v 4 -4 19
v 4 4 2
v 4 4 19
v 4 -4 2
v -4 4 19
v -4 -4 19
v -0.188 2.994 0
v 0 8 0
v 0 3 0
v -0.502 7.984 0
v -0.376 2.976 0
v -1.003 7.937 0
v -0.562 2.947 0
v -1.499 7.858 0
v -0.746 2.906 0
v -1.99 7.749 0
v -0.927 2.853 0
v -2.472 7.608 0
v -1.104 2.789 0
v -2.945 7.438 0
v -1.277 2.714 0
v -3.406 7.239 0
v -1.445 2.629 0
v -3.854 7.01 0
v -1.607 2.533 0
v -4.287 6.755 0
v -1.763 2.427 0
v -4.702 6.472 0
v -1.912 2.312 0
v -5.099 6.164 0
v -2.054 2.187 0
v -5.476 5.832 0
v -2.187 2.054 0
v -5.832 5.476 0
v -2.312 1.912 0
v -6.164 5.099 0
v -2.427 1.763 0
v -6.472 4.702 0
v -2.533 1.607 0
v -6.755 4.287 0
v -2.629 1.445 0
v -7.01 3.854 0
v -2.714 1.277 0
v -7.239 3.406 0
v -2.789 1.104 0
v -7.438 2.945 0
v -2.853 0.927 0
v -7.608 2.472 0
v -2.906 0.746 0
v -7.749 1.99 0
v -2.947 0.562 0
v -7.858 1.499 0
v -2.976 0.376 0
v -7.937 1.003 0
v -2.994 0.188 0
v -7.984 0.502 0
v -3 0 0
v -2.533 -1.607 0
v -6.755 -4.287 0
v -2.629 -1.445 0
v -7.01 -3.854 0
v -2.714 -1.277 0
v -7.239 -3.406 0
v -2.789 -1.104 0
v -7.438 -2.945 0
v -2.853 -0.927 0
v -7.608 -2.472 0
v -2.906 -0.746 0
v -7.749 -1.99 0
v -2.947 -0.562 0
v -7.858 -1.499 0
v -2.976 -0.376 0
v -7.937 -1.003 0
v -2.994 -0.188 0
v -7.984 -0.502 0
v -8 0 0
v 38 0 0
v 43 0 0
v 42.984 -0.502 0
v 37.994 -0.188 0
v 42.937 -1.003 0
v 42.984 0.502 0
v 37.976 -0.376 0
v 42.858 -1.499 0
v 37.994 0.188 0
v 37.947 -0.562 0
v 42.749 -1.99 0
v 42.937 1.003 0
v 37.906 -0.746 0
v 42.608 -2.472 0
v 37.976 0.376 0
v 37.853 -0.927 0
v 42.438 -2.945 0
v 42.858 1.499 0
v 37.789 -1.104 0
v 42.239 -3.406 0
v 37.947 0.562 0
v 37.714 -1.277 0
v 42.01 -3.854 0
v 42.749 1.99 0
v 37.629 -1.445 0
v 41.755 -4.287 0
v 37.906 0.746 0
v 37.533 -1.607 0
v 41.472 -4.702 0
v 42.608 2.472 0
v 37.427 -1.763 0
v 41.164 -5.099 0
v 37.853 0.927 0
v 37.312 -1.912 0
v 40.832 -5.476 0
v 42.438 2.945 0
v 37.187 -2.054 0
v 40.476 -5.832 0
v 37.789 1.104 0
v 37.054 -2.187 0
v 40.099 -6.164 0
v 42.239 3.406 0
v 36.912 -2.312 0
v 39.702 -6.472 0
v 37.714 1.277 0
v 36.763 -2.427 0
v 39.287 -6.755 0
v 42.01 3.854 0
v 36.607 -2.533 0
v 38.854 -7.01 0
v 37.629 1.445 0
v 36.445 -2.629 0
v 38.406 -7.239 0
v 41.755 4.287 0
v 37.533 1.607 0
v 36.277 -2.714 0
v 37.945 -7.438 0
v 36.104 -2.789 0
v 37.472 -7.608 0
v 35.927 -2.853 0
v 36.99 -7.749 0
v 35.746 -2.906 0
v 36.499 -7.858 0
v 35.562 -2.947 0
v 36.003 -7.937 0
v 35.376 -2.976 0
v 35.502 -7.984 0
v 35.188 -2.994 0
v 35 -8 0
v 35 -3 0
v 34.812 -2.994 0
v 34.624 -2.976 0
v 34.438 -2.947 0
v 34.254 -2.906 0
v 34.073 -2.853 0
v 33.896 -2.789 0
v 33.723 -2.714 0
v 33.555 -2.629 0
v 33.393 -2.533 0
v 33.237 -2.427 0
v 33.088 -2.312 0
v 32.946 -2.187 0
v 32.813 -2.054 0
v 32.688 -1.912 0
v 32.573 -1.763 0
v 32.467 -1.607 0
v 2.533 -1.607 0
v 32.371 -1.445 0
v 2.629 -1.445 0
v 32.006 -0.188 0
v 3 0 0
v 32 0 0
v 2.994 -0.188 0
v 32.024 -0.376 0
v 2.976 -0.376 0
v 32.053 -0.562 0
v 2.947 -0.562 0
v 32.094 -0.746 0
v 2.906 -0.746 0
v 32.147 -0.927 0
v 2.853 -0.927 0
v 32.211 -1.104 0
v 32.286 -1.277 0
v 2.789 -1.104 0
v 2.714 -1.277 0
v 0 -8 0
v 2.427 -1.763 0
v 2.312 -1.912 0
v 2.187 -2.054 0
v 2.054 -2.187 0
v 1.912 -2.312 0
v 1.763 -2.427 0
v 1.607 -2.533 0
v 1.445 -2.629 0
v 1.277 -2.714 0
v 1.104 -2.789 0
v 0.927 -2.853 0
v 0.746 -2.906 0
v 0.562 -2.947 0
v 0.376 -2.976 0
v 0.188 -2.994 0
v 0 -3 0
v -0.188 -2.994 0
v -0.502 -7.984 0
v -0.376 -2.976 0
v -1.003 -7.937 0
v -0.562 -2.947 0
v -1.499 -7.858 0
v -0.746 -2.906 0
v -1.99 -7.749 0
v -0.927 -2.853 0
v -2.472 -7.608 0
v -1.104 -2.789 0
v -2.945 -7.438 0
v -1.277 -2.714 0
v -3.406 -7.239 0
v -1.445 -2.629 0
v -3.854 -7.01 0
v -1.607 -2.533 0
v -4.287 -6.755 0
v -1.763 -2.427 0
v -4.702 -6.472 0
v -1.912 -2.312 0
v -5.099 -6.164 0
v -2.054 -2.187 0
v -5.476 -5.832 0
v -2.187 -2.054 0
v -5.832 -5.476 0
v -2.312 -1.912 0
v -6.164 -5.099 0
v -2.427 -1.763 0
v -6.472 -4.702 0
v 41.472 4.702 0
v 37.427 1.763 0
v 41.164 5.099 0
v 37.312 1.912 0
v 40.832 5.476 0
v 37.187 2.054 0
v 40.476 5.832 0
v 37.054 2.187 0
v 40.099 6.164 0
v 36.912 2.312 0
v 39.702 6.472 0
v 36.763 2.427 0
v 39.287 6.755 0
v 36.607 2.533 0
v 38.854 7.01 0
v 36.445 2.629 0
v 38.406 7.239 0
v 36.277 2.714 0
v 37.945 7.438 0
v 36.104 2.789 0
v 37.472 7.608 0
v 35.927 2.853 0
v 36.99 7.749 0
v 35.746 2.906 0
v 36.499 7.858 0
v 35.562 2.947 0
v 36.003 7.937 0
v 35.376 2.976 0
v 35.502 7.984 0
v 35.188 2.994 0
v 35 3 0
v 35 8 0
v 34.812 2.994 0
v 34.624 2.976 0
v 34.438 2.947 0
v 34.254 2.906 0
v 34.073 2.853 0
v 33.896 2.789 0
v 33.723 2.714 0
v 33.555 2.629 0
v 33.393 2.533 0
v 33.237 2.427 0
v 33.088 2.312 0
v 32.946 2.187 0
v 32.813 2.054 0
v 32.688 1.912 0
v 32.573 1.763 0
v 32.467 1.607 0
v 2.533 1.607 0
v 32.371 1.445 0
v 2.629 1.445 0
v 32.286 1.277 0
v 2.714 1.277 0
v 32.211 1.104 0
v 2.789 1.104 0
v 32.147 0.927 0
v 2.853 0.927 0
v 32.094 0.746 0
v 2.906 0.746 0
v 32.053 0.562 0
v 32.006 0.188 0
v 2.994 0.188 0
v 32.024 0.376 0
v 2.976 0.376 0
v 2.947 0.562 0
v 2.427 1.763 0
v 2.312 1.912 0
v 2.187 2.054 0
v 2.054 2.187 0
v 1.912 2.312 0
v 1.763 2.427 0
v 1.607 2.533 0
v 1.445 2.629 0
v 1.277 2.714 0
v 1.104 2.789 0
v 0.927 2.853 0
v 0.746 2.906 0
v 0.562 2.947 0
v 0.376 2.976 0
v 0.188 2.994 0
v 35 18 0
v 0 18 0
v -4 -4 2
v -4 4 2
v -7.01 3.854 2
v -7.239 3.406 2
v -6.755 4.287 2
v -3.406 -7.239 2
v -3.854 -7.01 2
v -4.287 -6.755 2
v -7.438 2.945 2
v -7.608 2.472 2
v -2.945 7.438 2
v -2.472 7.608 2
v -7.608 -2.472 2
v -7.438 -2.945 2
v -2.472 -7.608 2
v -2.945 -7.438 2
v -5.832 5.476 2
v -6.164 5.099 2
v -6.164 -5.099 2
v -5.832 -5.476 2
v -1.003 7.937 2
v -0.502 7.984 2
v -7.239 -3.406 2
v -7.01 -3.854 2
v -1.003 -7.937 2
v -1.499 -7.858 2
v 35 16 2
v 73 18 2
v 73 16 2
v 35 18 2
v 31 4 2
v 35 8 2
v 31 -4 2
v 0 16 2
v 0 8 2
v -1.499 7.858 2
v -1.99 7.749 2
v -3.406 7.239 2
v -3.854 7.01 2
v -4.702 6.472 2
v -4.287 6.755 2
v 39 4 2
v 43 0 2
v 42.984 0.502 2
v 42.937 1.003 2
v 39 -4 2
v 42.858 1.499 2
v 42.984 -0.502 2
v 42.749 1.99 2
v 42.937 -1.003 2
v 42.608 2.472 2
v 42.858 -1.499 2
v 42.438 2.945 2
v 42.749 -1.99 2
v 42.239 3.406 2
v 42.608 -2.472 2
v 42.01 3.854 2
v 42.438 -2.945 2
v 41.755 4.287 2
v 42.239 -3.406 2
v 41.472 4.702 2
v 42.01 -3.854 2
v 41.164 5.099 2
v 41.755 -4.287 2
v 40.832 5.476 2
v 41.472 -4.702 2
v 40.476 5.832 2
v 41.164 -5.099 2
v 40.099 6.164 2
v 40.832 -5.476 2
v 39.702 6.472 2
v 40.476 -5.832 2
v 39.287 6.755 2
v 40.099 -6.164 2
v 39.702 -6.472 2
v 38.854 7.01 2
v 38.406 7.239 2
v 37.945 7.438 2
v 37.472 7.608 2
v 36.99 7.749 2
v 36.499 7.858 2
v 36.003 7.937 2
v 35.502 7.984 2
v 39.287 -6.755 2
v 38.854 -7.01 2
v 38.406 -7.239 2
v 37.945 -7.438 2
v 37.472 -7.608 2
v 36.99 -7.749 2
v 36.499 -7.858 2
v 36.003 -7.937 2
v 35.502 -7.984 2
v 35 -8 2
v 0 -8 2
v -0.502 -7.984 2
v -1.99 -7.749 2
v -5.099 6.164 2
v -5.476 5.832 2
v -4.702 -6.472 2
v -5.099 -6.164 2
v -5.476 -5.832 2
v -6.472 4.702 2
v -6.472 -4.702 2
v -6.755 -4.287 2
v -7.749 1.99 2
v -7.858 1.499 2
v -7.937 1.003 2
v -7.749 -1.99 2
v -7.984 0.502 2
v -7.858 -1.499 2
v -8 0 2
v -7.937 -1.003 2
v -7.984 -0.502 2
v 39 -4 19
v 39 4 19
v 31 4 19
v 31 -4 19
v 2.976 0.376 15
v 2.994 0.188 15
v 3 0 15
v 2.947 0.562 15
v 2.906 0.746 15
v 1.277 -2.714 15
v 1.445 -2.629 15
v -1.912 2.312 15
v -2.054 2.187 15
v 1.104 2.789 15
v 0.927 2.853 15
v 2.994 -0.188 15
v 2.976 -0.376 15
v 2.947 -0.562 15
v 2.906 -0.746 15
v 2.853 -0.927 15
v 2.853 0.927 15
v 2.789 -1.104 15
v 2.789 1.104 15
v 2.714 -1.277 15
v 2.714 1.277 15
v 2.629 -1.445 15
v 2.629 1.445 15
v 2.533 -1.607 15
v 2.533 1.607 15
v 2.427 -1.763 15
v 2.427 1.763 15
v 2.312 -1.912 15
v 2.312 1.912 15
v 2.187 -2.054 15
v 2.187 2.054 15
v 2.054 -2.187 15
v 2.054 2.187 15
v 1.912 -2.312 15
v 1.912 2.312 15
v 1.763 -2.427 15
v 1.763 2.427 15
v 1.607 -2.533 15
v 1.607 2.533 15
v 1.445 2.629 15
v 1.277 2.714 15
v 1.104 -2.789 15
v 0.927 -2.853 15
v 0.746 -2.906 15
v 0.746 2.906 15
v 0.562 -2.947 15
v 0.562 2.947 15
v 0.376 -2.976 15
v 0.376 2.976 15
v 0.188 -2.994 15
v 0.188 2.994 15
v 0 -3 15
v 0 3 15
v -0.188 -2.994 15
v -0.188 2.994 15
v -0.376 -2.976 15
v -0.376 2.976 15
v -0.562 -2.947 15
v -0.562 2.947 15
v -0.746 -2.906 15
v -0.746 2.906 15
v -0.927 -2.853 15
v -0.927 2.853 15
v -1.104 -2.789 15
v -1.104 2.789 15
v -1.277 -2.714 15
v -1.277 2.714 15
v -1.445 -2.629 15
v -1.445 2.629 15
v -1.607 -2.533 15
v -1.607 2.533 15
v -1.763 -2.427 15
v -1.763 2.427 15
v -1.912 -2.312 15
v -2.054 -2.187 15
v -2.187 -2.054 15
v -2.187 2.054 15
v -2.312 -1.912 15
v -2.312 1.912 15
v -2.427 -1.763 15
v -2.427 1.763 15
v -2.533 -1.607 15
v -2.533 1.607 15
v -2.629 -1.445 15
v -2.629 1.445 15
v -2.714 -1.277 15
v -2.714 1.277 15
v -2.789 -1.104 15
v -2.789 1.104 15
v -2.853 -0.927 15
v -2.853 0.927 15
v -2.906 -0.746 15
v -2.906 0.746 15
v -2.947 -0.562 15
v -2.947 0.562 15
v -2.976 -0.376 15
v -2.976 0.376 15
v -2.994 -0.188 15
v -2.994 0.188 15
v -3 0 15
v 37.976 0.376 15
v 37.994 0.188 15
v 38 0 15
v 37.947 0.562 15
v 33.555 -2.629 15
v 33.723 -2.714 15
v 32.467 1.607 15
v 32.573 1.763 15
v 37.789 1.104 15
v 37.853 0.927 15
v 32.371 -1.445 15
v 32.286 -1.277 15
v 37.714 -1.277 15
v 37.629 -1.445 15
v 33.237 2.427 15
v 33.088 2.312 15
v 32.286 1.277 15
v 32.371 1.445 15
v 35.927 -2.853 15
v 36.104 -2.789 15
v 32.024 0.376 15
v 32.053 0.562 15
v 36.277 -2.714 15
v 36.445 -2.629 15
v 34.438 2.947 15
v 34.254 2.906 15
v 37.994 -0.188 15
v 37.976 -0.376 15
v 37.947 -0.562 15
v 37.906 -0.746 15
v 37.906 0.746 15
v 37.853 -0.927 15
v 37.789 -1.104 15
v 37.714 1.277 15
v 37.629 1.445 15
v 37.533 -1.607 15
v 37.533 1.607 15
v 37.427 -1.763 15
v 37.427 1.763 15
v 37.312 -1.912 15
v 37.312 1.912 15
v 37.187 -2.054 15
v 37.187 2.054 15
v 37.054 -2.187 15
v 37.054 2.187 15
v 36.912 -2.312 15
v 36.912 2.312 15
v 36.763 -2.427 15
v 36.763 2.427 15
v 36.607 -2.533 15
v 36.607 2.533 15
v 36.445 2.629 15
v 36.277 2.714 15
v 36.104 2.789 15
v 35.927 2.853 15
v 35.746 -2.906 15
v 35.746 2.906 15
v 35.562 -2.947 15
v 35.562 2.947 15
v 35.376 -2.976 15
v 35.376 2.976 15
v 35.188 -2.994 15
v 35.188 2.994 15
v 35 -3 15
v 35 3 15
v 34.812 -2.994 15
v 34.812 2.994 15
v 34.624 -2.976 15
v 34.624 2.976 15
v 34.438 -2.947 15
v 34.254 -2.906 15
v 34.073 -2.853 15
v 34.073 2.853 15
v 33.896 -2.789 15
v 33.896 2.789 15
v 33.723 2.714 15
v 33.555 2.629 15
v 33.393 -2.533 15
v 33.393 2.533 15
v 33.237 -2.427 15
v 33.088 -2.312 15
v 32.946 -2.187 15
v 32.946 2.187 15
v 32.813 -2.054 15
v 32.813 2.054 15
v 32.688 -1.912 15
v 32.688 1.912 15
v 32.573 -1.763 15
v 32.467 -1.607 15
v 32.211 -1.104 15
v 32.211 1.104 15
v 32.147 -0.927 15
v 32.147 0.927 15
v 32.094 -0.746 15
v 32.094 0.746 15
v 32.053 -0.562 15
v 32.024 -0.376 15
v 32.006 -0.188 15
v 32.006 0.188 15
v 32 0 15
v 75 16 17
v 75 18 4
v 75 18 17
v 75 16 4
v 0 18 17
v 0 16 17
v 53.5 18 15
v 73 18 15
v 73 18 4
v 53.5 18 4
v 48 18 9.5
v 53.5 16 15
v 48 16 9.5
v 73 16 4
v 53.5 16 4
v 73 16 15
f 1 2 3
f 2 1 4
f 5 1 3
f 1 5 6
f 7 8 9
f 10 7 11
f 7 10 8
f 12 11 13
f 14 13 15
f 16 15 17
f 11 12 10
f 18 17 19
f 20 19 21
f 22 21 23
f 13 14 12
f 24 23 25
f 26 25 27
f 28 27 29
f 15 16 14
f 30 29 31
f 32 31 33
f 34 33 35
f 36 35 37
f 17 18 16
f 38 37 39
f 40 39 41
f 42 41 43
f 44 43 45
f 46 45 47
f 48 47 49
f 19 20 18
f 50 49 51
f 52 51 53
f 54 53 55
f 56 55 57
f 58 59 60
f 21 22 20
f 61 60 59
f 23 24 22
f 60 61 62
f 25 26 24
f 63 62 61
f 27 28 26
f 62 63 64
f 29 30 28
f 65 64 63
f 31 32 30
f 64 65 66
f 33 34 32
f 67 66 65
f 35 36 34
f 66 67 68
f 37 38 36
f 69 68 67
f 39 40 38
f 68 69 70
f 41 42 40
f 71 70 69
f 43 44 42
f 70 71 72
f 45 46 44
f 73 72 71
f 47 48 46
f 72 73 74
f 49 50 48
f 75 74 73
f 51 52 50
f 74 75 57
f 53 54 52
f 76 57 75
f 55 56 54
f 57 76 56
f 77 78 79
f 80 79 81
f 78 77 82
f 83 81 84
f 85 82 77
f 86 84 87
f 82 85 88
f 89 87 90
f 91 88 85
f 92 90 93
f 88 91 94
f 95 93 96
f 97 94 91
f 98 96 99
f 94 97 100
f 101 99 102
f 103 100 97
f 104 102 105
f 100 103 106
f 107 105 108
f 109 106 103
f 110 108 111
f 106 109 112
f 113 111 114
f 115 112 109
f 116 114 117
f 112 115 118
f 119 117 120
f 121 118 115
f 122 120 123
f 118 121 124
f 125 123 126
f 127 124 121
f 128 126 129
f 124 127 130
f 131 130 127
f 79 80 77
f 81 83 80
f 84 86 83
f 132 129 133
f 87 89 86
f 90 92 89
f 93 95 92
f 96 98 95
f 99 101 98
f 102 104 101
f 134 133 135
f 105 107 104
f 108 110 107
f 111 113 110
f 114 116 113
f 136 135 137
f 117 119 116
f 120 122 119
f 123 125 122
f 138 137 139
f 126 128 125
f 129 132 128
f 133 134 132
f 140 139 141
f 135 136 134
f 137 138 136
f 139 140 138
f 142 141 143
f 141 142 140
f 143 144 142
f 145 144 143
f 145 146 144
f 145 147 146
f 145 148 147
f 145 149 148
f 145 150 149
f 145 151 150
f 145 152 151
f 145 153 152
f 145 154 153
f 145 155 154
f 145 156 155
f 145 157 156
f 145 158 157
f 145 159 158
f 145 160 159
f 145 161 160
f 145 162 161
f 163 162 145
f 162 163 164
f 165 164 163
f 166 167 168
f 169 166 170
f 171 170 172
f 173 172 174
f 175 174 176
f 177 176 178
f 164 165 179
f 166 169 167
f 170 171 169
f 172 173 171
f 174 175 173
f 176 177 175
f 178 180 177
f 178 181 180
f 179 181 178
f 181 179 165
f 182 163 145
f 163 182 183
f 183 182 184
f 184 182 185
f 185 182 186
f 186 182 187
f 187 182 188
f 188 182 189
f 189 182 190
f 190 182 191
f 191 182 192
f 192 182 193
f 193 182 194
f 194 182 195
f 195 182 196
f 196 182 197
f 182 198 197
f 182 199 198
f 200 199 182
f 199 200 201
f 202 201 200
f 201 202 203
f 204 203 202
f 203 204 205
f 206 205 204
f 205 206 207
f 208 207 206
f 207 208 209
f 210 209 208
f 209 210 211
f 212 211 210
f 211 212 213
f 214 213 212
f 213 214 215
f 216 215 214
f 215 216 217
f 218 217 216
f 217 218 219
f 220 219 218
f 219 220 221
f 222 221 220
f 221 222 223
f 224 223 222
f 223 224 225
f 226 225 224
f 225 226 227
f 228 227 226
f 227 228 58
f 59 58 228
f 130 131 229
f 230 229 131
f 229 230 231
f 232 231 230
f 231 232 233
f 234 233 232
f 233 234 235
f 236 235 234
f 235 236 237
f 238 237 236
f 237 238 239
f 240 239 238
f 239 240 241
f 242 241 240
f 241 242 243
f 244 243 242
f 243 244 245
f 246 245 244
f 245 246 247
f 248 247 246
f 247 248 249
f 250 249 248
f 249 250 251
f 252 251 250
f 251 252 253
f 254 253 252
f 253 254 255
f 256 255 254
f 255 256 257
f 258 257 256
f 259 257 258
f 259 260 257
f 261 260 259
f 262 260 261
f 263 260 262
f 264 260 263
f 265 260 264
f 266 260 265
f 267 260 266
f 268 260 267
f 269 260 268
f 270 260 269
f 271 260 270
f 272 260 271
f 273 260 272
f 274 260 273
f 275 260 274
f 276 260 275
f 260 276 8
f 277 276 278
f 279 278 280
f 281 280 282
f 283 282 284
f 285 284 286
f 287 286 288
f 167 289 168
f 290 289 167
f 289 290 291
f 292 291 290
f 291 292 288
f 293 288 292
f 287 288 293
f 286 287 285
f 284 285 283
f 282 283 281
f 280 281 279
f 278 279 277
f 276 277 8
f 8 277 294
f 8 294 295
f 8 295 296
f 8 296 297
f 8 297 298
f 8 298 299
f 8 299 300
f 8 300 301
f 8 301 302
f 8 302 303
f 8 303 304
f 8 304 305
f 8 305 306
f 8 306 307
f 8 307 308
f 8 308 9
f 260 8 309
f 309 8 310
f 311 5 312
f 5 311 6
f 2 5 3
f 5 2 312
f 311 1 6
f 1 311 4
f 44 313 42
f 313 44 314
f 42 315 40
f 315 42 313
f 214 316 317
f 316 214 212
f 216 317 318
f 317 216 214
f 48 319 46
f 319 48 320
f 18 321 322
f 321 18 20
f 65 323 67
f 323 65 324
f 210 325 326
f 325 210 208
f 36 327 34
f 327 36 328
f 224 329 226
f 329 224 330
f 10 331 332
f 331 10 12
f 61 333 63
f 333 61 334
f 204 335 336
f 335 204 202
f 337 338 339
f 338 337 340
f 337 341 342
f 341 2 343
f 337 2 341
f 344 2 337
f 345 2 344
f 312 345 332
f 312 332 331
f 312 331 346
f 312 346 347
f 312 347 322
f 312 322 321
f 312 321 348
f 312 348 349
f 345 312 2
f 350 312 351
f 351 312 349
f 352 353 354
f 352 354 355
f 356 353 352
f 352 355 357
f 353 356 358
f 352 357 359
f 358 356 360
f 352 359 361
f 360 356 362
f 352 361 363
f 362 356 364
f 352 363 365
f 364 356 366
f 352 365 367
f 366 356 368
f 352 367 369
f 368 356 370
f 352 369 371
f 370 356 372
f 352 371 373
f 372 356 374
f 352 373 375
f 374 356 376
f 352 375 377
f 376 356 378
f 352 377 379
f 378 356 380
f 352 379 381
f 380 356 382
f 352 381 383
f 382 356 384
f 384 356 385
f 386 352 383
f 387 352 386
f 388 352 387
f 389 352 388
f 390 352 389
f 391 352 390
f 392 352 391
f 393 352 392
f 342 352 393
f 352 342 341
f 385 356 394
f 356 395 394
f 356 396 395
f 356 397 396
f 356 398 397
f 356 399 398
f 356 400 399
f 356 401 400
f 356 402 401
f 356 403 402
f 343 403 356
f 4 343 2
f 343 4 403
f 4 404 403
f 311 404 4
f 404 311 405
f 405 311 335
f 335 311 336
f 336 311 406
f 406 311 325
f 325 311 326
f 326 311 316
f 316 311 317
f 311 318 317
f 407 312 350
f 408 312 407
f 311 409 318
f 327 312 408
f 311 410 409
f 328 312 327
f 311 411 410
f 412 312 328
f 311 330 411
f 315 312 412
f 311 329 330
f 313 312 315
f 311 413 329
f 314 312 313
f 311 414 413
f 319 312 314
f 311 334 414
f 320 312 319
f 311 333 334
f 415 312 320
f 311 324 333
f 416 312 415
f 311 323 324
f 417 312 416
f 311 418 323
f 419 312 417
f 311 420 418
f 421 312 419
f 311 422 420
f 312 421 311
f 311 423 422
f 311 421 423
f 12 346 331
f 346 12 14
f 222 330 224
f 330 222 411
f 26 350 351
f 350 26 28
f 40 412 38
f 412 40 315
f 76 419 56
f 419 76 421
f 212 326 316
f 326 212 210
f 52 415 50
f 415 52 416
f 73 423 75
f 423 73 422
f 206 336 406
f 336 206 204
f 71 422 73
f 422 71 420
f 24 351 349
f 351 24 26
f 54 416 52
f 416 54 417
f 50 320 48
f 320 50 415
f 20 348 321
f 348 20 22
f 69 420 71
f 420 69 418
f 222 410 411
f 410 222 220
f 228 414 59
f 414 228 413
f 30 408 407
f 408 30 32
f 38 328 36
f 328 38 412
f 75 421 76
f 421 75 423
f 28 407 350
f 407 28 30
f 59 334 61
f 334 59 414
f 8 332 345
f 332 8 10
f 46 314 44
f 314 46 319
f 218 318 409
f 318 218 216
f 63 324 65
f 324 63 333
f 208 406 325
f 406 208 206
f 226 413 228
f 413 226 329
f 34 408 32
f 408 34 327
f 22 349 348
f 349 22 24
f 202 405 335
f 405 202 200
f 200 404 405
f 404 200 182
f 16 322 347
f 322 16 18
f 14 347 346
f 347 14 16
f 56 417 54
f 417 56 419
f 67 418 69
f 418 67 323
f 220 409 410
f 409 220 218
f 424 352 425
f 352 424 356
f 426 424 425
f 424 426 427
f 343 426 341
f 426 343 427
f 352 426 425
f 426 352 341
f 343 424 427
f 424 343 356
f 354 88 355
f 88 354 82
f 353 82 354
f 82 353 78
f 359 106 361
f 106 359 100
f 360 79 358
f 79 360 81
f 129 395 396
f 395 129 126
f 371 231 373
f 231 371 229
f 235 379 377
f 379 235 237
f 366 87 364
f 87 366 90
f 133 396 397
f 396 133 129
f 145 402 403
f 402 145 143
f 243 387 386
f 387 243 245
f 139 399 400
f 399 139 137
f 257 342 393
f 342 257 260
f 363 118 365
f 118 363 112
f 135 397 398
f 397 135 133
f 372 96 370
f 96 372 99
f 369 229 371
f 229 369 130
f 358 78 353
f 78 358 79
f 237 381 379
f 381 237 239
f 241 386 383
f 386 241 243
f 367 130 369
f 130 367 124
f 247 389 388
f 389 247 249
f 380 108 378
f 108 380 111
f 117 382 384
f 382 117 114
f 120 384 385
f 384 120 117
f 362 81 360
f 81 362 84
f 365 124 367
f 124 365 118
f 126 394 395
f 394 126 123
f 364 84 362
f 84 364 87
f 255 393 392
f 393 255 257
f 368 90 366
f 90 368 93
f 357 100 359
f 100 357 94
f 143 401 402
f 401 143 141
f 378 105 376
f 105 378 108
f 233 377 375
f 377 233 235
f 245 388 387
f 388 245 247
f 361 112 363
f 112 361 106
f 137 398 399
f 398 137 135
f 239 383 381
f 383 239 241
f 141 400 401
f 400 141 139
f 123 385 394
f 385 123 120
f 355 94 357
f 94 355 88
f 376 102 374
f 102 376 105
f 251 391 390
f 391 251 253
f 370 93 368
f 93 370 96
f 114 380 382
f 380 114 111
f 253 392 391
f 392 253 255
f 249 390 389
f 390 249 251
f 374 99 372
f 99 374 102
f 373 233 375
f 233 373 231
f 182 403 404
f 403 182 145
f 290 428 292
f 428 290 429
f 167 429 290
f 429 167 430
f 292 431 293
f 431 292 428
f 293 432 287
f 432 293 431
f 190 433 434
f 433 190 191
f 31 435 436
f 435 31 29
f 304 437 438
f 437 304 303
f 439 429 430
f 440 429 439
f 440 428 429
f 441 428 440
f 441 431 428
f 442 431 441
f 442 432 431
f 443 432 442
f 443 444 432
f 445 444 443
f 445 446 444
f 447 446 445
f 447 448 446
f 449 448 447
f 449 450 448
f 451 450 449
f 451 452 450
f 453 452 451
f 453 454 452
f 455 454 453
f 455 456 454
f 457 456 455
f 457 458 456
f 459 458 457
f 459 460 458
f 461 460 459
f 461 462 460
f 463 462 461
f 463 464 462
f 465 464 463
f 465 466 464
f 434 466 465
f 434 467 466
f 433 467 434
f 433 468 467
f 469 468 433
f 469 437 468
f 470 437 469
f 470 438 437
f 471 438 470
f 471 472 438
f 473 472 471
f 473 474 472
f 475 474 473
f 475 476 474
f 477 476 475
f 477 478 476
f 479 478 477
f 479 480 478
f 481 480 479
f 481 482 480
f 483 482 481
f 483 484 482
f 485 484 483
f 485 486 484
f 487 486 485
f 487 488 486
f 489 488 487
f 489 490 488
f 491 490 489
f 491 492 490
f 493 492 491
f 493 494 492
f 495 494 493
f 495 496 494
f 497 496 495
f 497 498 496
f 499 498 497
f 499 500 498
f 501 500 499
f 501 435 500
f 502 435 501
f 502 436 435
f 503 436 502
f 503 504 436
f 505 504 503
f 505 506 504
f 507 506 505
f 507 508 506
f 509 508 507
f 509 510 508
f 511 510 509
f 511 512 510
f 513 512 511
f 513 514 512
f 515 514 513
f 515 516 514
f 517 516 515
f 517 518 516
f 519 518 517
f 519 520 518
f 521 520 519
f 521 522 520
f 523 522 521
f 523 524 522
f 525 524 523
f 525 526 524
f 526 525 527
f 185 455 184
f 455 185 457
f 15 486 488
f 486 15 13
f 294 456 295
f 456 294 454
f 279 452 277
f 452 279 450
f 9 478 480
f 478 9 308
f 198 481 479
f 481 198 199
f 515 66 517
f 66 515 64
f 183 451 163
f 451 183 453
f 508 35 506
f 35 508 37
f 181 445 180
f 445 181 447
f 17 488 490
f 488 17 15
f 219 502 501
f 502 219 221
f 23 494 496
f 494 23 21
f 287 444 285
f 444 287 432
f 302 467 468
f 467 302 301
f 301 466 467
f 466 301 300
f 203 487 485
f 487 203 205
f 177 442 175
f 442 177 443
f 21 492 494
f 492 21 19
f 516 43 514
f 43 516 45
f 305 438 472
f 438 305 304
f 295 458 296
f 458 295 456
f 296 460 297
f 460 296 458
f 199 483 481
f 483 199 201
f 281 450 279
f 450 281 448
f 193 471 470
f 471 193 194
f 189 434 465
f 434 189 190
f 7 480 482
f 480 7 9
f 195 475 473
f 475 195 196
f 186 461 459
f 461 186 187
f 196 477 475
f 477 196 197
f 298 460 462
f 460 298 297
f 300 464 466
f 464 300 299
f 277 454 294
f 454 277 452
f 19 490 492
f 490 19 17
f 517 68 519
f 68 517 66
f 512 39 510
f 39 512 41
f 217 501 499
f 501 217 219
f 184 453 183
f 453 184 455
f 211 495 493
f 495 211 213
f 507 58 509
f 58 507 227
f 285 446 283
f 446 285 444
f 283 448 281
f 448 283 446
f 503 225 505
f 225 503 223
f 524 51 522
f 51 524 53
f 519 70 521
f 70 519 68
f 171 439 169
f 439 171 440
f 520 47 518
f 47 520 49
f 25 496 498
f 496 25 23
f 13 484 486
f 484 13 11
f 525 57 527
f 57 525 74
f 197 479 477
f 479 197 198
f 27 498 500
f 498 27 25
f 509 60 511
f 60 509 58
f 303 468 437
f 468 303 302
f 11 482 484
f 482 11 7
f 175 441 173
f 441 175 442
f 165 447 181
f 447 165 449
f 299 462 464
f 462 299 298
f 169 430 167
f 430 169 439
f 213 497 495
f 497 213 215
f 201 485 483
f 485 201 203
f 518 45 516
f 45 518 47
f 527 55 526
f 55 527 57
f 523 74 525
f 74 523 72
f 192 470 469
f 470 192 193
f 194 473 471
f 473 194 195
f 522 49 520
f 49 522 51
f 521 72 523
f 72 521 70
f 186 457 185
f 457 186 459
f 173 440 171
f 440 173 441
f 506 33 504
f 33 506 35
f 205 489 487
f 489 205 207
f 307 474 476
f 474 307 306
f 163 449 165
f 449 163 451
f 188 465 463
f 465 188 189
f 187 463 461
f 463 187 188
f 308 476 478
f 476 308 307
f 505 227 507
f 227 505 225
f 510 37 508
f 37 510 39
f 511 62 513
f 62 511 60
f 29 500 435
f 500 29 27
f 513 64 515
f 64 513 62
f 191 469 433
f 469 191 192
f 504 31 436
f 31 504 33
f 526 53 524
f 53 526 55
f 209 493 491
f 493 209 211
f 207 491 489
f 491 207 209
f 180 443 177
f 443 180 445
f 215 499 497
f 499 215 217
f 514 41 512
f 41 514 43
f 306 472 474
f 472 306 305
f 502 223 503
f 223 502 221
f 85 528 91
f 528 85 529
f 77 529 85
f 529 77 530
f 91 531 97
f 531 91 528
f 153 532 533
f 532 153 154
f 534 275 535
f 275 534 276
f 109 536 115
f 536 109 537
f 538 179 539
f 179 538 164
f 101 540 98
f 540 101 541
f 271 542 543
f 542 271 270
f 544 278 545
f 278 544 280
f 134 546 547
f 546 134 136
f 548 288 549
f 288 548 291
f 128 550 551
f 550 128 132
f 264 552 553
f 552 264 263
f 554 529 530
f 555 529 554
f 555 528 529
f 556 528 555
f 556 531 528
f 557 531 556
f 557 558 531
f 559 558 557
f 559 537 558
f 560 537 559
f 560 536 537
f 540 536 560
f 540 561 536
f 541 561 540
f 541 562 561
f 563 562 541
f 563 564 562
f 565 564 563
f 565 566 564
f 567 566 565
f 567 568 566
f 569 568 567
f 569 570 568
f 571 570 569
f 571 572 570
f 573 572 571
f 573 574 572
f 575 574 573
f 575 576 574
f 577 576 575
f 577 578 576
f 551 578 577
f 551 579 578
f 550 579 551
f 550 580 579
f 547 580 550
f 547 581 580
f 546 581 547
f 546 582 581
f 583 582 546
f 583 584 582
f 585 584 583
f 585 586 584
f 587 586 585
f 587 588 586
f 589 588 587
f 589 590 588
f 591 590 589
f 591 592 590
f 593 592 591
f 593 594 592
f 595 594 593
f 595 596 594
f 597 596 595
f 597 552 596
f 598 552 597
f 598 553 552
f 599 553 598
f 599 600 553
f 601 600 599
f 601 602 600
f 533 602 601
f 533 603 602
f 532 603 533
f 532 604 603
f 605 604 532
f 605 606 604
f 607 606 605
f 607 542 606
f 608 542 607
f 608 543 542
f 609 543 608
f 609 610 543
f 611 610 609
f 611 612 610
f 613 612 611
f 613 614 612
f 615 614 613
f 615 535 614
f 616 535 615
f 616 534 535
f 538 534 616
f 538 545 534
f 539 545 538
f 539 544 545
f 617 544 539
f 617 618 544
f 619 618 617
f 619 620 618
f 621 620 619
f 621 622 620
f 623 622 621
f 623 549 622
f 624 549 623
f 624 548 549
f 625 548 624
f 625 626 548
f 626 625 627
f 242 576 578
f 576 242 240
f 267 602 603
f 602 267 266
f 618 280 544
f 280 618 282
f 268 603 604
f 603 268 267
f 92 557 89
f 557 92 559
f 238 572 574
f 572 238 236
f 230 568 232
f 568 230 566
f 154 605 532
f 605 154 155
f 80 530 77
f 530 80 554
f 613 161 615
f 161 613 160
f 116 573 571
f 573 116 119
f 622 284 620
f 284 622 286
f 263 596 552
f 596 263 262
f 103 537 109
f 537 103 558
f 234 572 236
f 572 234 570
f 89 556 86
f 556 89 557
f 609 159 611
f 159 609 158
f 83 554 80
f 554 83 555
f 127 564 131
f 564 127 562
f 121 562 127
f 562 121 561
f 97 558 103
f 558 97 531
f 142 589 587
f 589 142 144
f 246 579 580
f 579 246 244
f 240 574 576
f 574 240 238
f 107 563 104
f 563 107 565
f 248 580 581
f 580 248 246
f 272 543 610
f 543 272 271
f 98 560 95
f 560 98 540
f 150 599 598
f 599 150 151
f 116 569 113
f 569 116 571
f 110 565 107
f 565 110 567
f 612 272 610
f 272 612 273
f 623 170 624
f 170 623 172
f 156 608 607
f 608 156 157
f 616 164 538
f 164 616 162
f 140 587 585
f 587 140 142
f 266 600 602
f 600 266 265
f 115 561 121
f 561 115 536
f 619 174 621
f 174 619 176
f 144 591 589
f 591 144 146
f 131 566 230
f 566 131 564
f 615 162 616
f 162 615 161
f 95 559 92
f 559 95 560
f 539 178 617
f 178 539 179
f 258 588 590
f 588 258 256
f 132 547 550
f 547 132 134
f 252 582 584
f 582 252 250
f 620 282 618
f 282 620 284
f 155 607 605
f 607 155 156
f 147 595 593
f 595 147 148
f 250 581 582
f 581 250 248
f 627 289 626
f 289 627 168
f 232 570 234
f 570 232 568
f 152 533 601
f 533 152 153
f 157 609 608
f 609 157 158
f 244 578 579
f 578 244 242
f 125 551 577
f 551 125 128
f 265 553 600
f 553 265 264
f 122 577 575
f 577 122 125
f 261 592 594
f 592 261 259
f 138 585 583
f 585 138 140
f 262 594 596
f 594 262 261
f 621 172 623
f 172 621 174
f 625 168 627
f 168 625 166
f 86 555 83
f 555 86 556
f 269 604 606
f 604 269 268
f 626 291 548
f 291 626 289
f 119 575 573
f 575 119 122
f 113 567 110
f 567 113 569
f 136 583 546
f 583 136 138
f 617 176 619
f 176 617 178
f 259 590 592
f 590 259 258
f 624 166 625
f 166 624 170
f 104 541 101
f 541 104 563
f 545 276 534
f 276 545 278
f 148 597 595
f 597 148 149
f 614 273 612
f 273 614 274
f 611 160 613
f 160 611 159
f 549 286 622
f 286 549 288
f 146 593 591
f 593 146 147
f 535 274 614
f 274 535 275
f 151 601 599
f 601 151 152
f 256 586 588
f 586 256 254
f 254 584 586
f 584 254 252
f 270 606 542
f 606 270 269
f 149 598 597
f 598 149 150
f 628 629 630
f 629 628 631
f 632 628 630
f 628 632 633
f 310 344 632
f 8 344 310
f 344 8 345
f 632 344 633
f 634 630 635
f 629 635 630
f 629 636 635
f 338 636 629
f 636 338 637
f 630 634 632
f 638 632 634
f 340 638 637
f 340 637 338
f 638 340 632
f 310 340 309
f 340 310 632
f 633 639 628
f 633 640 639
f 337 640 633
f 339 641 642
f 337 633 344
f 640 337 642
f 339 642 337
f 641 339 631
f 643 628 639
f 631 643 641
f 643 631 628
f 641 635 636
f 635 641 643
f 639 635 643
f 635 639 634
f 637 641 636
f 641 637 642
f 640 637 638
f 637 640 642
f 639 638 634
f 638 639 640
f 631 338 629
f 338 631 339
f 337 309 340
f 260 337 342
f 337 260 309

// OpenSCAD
$fn = 100;

is_laser_cut = true;
laser_material_thickness = 3;
threed_print_thickness = 5;
material_thickness = is_laser_cut ?
                        laser_material_thickness :
                        threed_print_thickness;

pin_diameter = 6;
pin_radius = pin_diameter/2;

gripper_track_long_horizontal_leg_length = 25;
gripper_track_short_horizontal_leg_length = 2;
gripper_track_vertical_length = 20;

cutter_track_length = gripper_track_long_horizontal_leg_length + gripper_track_short_horizontal_leg_length;

bottom_gripper_track_offset = 0;
bottom_gripper_track_height = gripper_track_vertical_length;
gripper_track_separation = 70;
top_gripper_track_offset = bottom_gripper_track_offset + bottom_gripper_track_height + gripper_track_separation;
top_gripper_track_height = gripper_track_vertical_length;
gripper_cutter_track_separation = 30 + gripper_track_vertical_length-pin_diameter;
cutter_track_offset = top_gripper_track_offset + top_gripper_track_height + gripper_cutter_track_separation;
cutter_track_height = pin_diameter;

slider_side = gripper_track_long_horizontal_leg_length + gripper_track_short_horizontal_leg_length;
slider_vertical_travel = 20;
total_slider_travel = slider_side + slider_vertical_travel - 4*pin_radius + gripper_track_vertical_length;

horizontal_track_separation = 20;

bottom_gripper_slider_track_offset = bottom_gripper_track_offset + bottom_gripper_track_height - pin_diameter;
top_gripper_slider_track_offset = top_gripper_track_offset + gripper_track_vertical_length - pin_diameter;
cutter_slider_track_offset = cutter_track_offset;
cutter_slider_track_height = 0
    + pin_radius
    + (gripper_track_vertical_length - pin_diameter)
    + slider_vertical_travel
    + (slider_side - pin_diameter)
    + pin_radius;
second_slider_track_offset = 35;
slider_margin = 5;
slider_width = 2*(cutter_track_length + second_slider_track_offset) + horizontal_track_separation + 2*slider_margin;
slider_length = slider_margin +
                cutter_slider_track_offset +
                cutter_slider_track_height +
                slider_margin;
slider_thickness = material_thickness;


top_guide_wall_thickness = material_thickness;
guide_support_thickness = slider_thickness+0.5;
guide_support_diameter = 10;
guide_support_radius = guide_support_diameter/2;
guide_support_hole_diameter = 3.5;
giode_support_hole_radius = guide_support_hole_diameter/2;
guide_width = slider_width + 2*guide_support_diameter;
guide_length = slider_margin +
               bottom_gripper_track_height +
               gripper_track_separation +
               top_gripper_track_height +
               gripper_cutter_track_separation +
               cutter_track_height +
               slider_margin; //2*vertical_track_separation + gripper_track_vertical_length;
guide_thickness = material_thickness;

pin_pad_thickness = 2;
pin_pad_radius = pin_radius + 5;
pin_stickout = 15;
pin_height = 2*guide_thickness + guide_support_thickness + pin_stickout;

pin_cap_radius = pin_radius + 1;
pin_cap_pad_radius = pin_pad_radius;
pin_cap_pad_thickness = pin_pad_thickness;



module gripper_track(h) {
    curve_cut = pin_radius/2;
    
    p1 = [ pin_radius,
           pin_radius + gripper_track_vertical_length - pin_diameter];
    p2 = [ pin_radius + gripper_track_long_horizontal_leg_length - pin_diameter,
           pin_radius + gripper_track_vertical_length - pin_diameter];
    p3 = [ pin_radius + gripper_track_long_horizontal_leg_length - pin_diameter,
           pin_radius];
    p4 = [ pin_radius + gripper_track_long_horizontal_leg_length + gripper_track_short_horizontal_leg_length - pin_diameter,
           pin_radius];
    
    //polygon(points = [p1,p2,p3,p4]);
    
    linear_extrude(height = h)
    polygon(points = [
        p1 + [-pin_radius, -pin_radius],
        p2 + [-pin_radius, -pin_radius],
        p3 + [-pin_radius, -pin_radius],
        p4 + [ pin_radius, -pin_radius],
        
        p4 + [ pin_radius,  pin_radius],
        p3 + [ pin_radius,  pin_radius],
        p2 + [ pin_radius,  pin_radius],
        p1 + [-pin_radius,  pin_radius]
    ]);
}

module cutter_track(h) {
    cube([cutter_track_length, 2 * pin_radius, h]);
}

module top_gripper_drive_track(h) {
    p1 = [ pin_radius,
           pin_radius ];
    p2 = [ pin_radius + slider_side - pin_diameter,
           pin_radius + slider_side - pin_diameter];
    p3 = [ pin_radius + slider_side - pin_diameter,
           pin_radius + slider_vertical_travel + slider_side - pin_diameter];
    //polygon(points = [p1,p2,p3]);

    // right + bottom_right edges are two lines
    // x = pin_radius
    // y = x - sqrt(2) * pin_radius
    // therefore they intersect at
    // y = pin_radius - sqrt(2) * pin_radius
    //   = pin_radius * (1 - sqrt(2))
    // this is below the origin so negate it to get the length
    angle_offset = -pin_radius*(1 - sqrt(2));
    linear_extrude(height = h)
    polygon(points = [
        p1 + [-pin_radius  , angle_offset],
        p1 + [-pin_radius  ,-pin_radius],
        p1 + [ angle_offset,-pin_radius],
        
        p2 + [ pin_radius,-angle_offset],
        
        p3 + [ pin_radius, pin_radius],
        p3 + [-pin_radius, pin_radius],
        
        p2 + [-pin_radius, angle_offset]
    ]);
}

module bottom_gripper_drive_track(h) {
    p1 = [ pin_radius,
           pin_radius ];
    p2 = [ pin_radius ,
           pin_radius + slider_vertical_travel/2];
    p3 = [ pin_radius + (slider_side - pin_diameter),
           pin_radius + slider_vertical_travel/2 + (slider_side - pin_diameter)];
    p4 = [ pin_radius + slider_side - pin_diameter,
           pin_radius + slider_vertical_travel + (slider_side - pin_diameter)];
    //polygon(points = [p1,p2,p3,p4]);

    // right + bottom_right edges are two lines
    // x = pin_radius
    // y = x - sqrt(2) * pin_radius
    // therefore they intersect at
    // y = pin_radius - sqrt(2) * pin_radius
    //   = pin_radius * (1 - sqrt(2))
    // this is below the origin so negate it to get the length
    angle_offset = -pin_radius*(1 - sqrt(2));
    linear_extrude(height = h)
    polygon(points = [
        p1 + [-pin_radius,-pin_radius],
        p1 + [ pin_radius,-pin_radius],

        p2 + [ pin_radius,-angle_offset],
        
        p3 + [ pin_radius,-angle_offset],
        
        p4 + [ pin_radius, pin_radius],
        p4 + [-pin_radius, pin_radius],
        
        p3 + [-pin_radius, angle_offset],

        p2 + [-pin_radius, angle_offset]
    ]);
}







module cutter_drive_track(h) {
    p1 = [ pin_radius,
           pin_radius ];
    p2 = [ pin_radius,
           pin_radius + gripper_track_vertical_length - pin_diameter + slider_vertical_travel];
    p3 = [ pin_radius + slider_side - pin_diameter,
           pin_radius + gripper_track_vertical_length - pin_diameter + slider_vertical_travel + slider_side - pin_diameter];
    //polygon(points = [p1,p2,p3]);

    // right + bottom_right edges are two lines
    // x = pin_radius
    // y = x - sqrt(2) * pin_radius
    // therefore they intersect at
    // y = pin_radius - sqrt(2) * pin_radius
    //   = pin_radius * (1 - sqrt(2))
    // this is below the origin so negate it to get the length
    angle_offset = -pin_radius*(1 - sqrt(2));
    linear_extrude(height = h)
    polygon(points = [
        p1 + [-pin_radius,-pin_radius],
        p1 + [ pin_radius,-pin_radius],
        
        p2 + [ pin_radius,-angle_offset],
        
        p3 + [ pin_radius,-angle_offset], 
        p3 + [ pin_radius, pin_radius],
        p3 + [-angle_offset, pin_radius],
        
        p2 + [-pin_radius, angle_offset]
    ]);
}

module single_slider_tracks(track_height) {
    translate([0,cutter_slider_track_offset,0])
    cutter_drive_track(track_height);

    translate([0,top_gripper_slider_track_offset,0])
    top_gripper_drive_track(track_height);

    translate([0,bottom_gripper_slider_track_offset, 0])
    bottom_gripper_drive_track(track_height);
}

module slider_tracks(track_height) {
    translate([second_slider_track_offset,0,0])
    single_slider_tracks(track_height);
    
    //translate([-second_slider_track_offset,0,0])
    single_slider_tracks(track_height);
}

module slider() {
    difference() {
        union() {
            cube([slider_width, slider_length, slider_thickness]);
            
//            handle_width = 10;
//            translate([slider_width/2-handle_width/2,slider_length,0])
//            cube([handle_width,40,slider_thickness]);
        }
    
        track_height = 100;
        translate([slider_margin, slider_margin, -10]) {
            #slider_tracks(track_height);
    
            translate([2*(cutter_track_length+second_slider_track_offset)+horizontal_track_separation,0,0])
            mirror([1,0,0])
            #slider_tracks(track_height);
        }
    }
}

module single_guide_tracks(track_height) {
    translate([0,bottom_gripper_track_offset,0])
    gripper_track(track_height);
            
    translate([0,top_gripper_track_offset,0])
    gripper_track(track_height);
    
    translate([0,cutter_track_offset,0])
    cutter_track(track_height);
}

module guide_tracks(track_height) {
    single_guide_tracks(track_height);

    translate([second_slider_track_offset,0,0])
    single_guide_tracks(track_height);
}

module guide() {
    difference() {
        cube([guide_width, guide_length, guide_thickness]);



        // tracks

        track_height = 100;
    
        translate([guide_support_diameter+slider_margin,slider_margin,-10]) {
            #guide_tracks(track_height);
        
            translate([2*(cutter_track_length+second_slider_track_offset)+horizontal_track_separation,0,0])
            mirror([1,0,0])
            #guide_tracks(track_height);
        }



        // supports

        // bottom left
        translate([guide_support_radius, guide_support_radius, 0]) {
            translate([0,0,guide_thickness])
            %cylinder(d = guide_support_diameter, h = slider_thickness+0.2);
        
            #cylinder(d = guide_support_hole_diameter, h = 100, center = true);
        }

        // bottom right
        translate([guide_width-guide_support_radius, guide_support_radius, 0]) {
            translate([0,0,guide_thickness])
            %cylinder(d = guide_support_diameter, h = slider_thickness+0.2);
        
            #cylinder(d = guide_support_hole_diameter, h = 100, center = true);
        }

        // top left
        translate([guide_support_radius, guide_length-guide_support_radius, 0]) {
            translate([0,0,guide_thickness])
            %cylinder(d = guide_support_diameter, h = slider_thickness+0.2);
        
            #cylinder(d = guide_support_hole_diameter, h = 100, center = true);
        }

        // top right
        translate([guide_width-guide_support_radius, guide_length-guide_support_radius, 0]) {
            translate([0,0,guide_thickness])
            %cylinder(d = guide_support_diameter, h = guide_support_thickness);
        
            #cylinder(d = guide_support_hole_diameter, h = 100, center = true);
        }
    }
}

module guide_support(){
    difference() {
        cylinder(d = guide_support_diameter, h = guide_support_thickness);

        cylinder(d = guide_support_hole_diameter, h = 100, center = true);
    }
}

module pin() {
    translate([0,0,pin_pad_thickness])
    cylinder(r = pin_radius, h = pin_height);
    
    translate([second_slider_track_offset,0,pin_pad_thickness])
    cylinder(r = pin_radius, h = pin_height);

    cylinder(r = pin_pad_radius, h = pin_pad_thickness);

    translate([second_slider_track_offset,0,0])
    cylinder(r = pin_pad_radius, h = pin_pad_thickness);

    translate([0,-pin_pad_radius,0])
    cube([second_slider_track_offset, 2*pin_pad_radius, pin_pad_thickness]);
}

module base_pin_cap() {
    s = 2*pin_cap_radius;
    h = pin_stickout+2;
    difference() {
        union() {
            translate([-s/2,-s/2,0])
            cube([s,s,h+pin_cap_pad_thickness]);
            cylinder(r = pin_cap_pad_radius, h = pin_cap_pad_thickness);
    
            translate([second_slider_track_offset,0,0])
            translate([-s/2,-s/2,0])
            cube([s,s,h+pin_cap_pad_thickness]);
            
            translate([second_slider_track_offset,0,0])
            cylinder(r = pin_cap_pad_radius, h = pin_cap_pad_thickness);
    
            translate([0,-pin_cap_pad_radius,0])
            cube([second_slider_track_offset, 2*pin_cap_pad_radius, pin_cap_pad_thickness]);
        }

        h2 = pin_stickout + pin_cap_pad_thickness + 10;
        pin_cap_clearance_with_guide_place = 2; // having a gap is important for preventing pinching!
        pin_cap_hole_depth = -h2 + pin_cap_pad_thickness + pin_stickout - pin_cap_clearance_with_guide_place;
        translate([0,
                   0,
                   pin_cap_hole_depth])
        #cylinder(r = pin_radius, h = h2);
            
        translate([second_slider_track_offset,
                   0,
                   pin_cap_hole_depth])
        #cylinder(r = pin_radius, h = h2);
    
    }
}

module left_pin_cap() {
    base_pin_cap();

    centering_guide_offset = 10;
    
    translate([0,pin_cap_pad_radius,0])
    cube([second_slider_track_offset,centering_guide_offset,pin_cap_pad_thickness]);

    centering_guide_stickout = 40;

    difference() {
        translate([0,
                   pin_cap_pad_radius+centering_guide_offset-pin_cap_pad_thickness,
                   pin_cap_pad_thickness])
        cube([second_slider_track_offset+centering_guide_stickout,
              pin_cap_pad_thickness,
              pin_stickout]);

//        translate([second_slider_track_offset+pin_cap_pad_radius-10,
//                   pin_cap_pad_radius,
//                   pin_cap_pad_thickness/2 + pin_stickout/2])
//        #cube([100,10,2]);

        center_inset = 0.0;
        center_position = horizontal_track_separation/2 + pin_radius - center_inset;
        outer_inset = 2;
        outer_width = pin_stickout-2*outer_inset;
        outer_length = (centering_guide_stickout - outer_inset) // rightmost extent of stickout
                     - center_position // leftmost point of the centering guide hole
                     - (outer_width/2); // centering hole half width
        
        // stickout / centering guide frame
        translate([second_slider_track_offset+center_position+outer_width/2,
                   pin_cap_pad_radius,
                   pin_cap_pad_thickness + outer_inset])
        #cube([outer_length,100,outer_width]);
        
        // centering guide hole
        s = outer_width/sqrt(2);
        translate([second_slider_track_offset+center_position,
                   pin_cap_pad_radius,
                   pin_cap_pad_thickness+pin_stickout/2])
        rotate([0,45,0])
        #cube([s,100,s]);

        // bevel
        translate([second_slider_track_offset+centering_guide_stickout-2,
                   pin_cap_pad_radius,
                   pin_cap_pad_thickness])
        rotate([0,45,0])
        #cube([10,100,10]);
    }
}

module right_pin_cap() {
    mirror([1,0,0]) {
        base_pin_cap();

        centering_guide_offset = 10;
    
        difference() {
            translate([0,pin_cap_pad_radius,0])
            cube([second_slider_track_offset,centering_guide_offset+1+pin_cap_pad_thickness,pin_cap_pad_thickness]);

            translate([second_slider_track_offset-2,
                       pin_cap_pad_radius,
                       pin_cap_pad_thickness])
            rotate([0,45,0])
            #cube([10,centering_guide_offset+1,10]);
        }

        centering_guide_stickout = 40;
    
        difference() {
            translate([
                0,
                pin_cap_pad_radius+centering_guide_offset+1,
                0])
            cube([second_slider_track_offset+centering_guide_stickout,
                  pin_cap_pad_thickness,
                  pin_stickout+pin_cap_pad_thickness]);
    
//            translate([second_slider_track_offset+pin_cap_pad_radius-10,
//                       pin_cap_pad_radius,
//                       pin_cap_pad_thickness/2 + pin_stickout/2])
//            #cube([100,10,2]);
    
            center_inset = 0.5;
            outer_inset = 2;
            outer_width = pin_stickout-2*outer_inset;
            outer_length = (centering_guide_stickout - outer_inset) // rightmost extent of stickout
                         - (pin_cap_pad_radius - center_inset) // leftmost point of the centering guide hole
                         - (outer_width/2); // centering hole half width
            
            // stickout / centering guide frame
            translate([second_slider_track_offset+pin_cap_pad_radius-center_inset+outer_width/2,
                       pin_cap_pad_radius,
                       pin_cap_pad_thickness + outer_inset])
            #cube([outer_length,100,outer_width]);
            
            // centering guide hole
            s = outer_width/sqrt(2);
            translate([second_slider_track_offset+pin_cap_pad_radius-center_inset,
                       pin_cap_pad_radius,
                       pin_cap_pad_thickness+pin_stickout/2])
            rotate([0,45,0])
            #cube([s,100,s]);

            // bevel
            translate([second_slider_track_offset+centering_guide_stickout-2,
                       pin_cap_pad_radius,
                       0])
            rotate([0,45,0])
            #cube([10,100,10]);
        }
    }
}


module gripper_pad() {
    s = 2*pin_cap_radius;
    h = pin_stickout;
    gripper_radius = pin_radius + horizontal_track_separation/2 + 5;

    
    intersection() {
        #
        translate([-sqrt(2),0,0])
        rotate([0,0,-45])
        translate([0,0,-50])
        cube([100,100,100]);
        
        difference() {
            translate([0,0,pin_cap_pad_thickness+h/2])
            cylinder(r = gripper_radius, h = h, center = true);
    
            #cylinder(r = gripper_radius - 2, h = 100, center = true);
    
            indent_count = 28;
            for (i = [0:indent_count]) {
                rotate([0,0,(360/indent_count)*i])
                translate([gripper_radius,0,10])
                #cylinder(r = 1, h = 50, center = true);
            }
        }
    }

    translate([0,0,pin_cap_pad_thickness])
    difference() {
        translate([-s/2-1,-s/2-1,0])
        cube([s+2,s+2,h]);
    
        #translate([-s/2-0.1,-s/2-0.1,-10])
        cube([s+0.2,s+0.2,100]);
    }

    spoke_length = 50;

    difference() {
        intersection() {
            for (i = [0:1]) {
                rotate([0,0,-90*i+45])
                translate([spoke_length/2,0,h/2+pin_cap_pad_thickness])
                cube([spoke_length,2,h], center = true);
            }
            
            #cylinder(r = gripper_radius - 2 + 0.1, h = 100, center = true);
        }
    
        #translate([-s/2-0.1,-s/2-0.1,-10])
        cube([s+0.2,s+0.2,100]);

    }
}





$t = 0;
delta = $t < 0.5 ?
            -2*$t*(total_slider_travel) :
            -2*(1-$t)*(total_slider_travel);

//translate([200,0,0])
//projection()
//slider();

//projection()
//guide();

//guide_support();

//translate([13,25,0])
//pin();

//base_pin_cap();

//translate([-60,0,0])
left_pin_cap();

//translate([60,0,0])
//right_pin_cap();

//gripper_pad();
